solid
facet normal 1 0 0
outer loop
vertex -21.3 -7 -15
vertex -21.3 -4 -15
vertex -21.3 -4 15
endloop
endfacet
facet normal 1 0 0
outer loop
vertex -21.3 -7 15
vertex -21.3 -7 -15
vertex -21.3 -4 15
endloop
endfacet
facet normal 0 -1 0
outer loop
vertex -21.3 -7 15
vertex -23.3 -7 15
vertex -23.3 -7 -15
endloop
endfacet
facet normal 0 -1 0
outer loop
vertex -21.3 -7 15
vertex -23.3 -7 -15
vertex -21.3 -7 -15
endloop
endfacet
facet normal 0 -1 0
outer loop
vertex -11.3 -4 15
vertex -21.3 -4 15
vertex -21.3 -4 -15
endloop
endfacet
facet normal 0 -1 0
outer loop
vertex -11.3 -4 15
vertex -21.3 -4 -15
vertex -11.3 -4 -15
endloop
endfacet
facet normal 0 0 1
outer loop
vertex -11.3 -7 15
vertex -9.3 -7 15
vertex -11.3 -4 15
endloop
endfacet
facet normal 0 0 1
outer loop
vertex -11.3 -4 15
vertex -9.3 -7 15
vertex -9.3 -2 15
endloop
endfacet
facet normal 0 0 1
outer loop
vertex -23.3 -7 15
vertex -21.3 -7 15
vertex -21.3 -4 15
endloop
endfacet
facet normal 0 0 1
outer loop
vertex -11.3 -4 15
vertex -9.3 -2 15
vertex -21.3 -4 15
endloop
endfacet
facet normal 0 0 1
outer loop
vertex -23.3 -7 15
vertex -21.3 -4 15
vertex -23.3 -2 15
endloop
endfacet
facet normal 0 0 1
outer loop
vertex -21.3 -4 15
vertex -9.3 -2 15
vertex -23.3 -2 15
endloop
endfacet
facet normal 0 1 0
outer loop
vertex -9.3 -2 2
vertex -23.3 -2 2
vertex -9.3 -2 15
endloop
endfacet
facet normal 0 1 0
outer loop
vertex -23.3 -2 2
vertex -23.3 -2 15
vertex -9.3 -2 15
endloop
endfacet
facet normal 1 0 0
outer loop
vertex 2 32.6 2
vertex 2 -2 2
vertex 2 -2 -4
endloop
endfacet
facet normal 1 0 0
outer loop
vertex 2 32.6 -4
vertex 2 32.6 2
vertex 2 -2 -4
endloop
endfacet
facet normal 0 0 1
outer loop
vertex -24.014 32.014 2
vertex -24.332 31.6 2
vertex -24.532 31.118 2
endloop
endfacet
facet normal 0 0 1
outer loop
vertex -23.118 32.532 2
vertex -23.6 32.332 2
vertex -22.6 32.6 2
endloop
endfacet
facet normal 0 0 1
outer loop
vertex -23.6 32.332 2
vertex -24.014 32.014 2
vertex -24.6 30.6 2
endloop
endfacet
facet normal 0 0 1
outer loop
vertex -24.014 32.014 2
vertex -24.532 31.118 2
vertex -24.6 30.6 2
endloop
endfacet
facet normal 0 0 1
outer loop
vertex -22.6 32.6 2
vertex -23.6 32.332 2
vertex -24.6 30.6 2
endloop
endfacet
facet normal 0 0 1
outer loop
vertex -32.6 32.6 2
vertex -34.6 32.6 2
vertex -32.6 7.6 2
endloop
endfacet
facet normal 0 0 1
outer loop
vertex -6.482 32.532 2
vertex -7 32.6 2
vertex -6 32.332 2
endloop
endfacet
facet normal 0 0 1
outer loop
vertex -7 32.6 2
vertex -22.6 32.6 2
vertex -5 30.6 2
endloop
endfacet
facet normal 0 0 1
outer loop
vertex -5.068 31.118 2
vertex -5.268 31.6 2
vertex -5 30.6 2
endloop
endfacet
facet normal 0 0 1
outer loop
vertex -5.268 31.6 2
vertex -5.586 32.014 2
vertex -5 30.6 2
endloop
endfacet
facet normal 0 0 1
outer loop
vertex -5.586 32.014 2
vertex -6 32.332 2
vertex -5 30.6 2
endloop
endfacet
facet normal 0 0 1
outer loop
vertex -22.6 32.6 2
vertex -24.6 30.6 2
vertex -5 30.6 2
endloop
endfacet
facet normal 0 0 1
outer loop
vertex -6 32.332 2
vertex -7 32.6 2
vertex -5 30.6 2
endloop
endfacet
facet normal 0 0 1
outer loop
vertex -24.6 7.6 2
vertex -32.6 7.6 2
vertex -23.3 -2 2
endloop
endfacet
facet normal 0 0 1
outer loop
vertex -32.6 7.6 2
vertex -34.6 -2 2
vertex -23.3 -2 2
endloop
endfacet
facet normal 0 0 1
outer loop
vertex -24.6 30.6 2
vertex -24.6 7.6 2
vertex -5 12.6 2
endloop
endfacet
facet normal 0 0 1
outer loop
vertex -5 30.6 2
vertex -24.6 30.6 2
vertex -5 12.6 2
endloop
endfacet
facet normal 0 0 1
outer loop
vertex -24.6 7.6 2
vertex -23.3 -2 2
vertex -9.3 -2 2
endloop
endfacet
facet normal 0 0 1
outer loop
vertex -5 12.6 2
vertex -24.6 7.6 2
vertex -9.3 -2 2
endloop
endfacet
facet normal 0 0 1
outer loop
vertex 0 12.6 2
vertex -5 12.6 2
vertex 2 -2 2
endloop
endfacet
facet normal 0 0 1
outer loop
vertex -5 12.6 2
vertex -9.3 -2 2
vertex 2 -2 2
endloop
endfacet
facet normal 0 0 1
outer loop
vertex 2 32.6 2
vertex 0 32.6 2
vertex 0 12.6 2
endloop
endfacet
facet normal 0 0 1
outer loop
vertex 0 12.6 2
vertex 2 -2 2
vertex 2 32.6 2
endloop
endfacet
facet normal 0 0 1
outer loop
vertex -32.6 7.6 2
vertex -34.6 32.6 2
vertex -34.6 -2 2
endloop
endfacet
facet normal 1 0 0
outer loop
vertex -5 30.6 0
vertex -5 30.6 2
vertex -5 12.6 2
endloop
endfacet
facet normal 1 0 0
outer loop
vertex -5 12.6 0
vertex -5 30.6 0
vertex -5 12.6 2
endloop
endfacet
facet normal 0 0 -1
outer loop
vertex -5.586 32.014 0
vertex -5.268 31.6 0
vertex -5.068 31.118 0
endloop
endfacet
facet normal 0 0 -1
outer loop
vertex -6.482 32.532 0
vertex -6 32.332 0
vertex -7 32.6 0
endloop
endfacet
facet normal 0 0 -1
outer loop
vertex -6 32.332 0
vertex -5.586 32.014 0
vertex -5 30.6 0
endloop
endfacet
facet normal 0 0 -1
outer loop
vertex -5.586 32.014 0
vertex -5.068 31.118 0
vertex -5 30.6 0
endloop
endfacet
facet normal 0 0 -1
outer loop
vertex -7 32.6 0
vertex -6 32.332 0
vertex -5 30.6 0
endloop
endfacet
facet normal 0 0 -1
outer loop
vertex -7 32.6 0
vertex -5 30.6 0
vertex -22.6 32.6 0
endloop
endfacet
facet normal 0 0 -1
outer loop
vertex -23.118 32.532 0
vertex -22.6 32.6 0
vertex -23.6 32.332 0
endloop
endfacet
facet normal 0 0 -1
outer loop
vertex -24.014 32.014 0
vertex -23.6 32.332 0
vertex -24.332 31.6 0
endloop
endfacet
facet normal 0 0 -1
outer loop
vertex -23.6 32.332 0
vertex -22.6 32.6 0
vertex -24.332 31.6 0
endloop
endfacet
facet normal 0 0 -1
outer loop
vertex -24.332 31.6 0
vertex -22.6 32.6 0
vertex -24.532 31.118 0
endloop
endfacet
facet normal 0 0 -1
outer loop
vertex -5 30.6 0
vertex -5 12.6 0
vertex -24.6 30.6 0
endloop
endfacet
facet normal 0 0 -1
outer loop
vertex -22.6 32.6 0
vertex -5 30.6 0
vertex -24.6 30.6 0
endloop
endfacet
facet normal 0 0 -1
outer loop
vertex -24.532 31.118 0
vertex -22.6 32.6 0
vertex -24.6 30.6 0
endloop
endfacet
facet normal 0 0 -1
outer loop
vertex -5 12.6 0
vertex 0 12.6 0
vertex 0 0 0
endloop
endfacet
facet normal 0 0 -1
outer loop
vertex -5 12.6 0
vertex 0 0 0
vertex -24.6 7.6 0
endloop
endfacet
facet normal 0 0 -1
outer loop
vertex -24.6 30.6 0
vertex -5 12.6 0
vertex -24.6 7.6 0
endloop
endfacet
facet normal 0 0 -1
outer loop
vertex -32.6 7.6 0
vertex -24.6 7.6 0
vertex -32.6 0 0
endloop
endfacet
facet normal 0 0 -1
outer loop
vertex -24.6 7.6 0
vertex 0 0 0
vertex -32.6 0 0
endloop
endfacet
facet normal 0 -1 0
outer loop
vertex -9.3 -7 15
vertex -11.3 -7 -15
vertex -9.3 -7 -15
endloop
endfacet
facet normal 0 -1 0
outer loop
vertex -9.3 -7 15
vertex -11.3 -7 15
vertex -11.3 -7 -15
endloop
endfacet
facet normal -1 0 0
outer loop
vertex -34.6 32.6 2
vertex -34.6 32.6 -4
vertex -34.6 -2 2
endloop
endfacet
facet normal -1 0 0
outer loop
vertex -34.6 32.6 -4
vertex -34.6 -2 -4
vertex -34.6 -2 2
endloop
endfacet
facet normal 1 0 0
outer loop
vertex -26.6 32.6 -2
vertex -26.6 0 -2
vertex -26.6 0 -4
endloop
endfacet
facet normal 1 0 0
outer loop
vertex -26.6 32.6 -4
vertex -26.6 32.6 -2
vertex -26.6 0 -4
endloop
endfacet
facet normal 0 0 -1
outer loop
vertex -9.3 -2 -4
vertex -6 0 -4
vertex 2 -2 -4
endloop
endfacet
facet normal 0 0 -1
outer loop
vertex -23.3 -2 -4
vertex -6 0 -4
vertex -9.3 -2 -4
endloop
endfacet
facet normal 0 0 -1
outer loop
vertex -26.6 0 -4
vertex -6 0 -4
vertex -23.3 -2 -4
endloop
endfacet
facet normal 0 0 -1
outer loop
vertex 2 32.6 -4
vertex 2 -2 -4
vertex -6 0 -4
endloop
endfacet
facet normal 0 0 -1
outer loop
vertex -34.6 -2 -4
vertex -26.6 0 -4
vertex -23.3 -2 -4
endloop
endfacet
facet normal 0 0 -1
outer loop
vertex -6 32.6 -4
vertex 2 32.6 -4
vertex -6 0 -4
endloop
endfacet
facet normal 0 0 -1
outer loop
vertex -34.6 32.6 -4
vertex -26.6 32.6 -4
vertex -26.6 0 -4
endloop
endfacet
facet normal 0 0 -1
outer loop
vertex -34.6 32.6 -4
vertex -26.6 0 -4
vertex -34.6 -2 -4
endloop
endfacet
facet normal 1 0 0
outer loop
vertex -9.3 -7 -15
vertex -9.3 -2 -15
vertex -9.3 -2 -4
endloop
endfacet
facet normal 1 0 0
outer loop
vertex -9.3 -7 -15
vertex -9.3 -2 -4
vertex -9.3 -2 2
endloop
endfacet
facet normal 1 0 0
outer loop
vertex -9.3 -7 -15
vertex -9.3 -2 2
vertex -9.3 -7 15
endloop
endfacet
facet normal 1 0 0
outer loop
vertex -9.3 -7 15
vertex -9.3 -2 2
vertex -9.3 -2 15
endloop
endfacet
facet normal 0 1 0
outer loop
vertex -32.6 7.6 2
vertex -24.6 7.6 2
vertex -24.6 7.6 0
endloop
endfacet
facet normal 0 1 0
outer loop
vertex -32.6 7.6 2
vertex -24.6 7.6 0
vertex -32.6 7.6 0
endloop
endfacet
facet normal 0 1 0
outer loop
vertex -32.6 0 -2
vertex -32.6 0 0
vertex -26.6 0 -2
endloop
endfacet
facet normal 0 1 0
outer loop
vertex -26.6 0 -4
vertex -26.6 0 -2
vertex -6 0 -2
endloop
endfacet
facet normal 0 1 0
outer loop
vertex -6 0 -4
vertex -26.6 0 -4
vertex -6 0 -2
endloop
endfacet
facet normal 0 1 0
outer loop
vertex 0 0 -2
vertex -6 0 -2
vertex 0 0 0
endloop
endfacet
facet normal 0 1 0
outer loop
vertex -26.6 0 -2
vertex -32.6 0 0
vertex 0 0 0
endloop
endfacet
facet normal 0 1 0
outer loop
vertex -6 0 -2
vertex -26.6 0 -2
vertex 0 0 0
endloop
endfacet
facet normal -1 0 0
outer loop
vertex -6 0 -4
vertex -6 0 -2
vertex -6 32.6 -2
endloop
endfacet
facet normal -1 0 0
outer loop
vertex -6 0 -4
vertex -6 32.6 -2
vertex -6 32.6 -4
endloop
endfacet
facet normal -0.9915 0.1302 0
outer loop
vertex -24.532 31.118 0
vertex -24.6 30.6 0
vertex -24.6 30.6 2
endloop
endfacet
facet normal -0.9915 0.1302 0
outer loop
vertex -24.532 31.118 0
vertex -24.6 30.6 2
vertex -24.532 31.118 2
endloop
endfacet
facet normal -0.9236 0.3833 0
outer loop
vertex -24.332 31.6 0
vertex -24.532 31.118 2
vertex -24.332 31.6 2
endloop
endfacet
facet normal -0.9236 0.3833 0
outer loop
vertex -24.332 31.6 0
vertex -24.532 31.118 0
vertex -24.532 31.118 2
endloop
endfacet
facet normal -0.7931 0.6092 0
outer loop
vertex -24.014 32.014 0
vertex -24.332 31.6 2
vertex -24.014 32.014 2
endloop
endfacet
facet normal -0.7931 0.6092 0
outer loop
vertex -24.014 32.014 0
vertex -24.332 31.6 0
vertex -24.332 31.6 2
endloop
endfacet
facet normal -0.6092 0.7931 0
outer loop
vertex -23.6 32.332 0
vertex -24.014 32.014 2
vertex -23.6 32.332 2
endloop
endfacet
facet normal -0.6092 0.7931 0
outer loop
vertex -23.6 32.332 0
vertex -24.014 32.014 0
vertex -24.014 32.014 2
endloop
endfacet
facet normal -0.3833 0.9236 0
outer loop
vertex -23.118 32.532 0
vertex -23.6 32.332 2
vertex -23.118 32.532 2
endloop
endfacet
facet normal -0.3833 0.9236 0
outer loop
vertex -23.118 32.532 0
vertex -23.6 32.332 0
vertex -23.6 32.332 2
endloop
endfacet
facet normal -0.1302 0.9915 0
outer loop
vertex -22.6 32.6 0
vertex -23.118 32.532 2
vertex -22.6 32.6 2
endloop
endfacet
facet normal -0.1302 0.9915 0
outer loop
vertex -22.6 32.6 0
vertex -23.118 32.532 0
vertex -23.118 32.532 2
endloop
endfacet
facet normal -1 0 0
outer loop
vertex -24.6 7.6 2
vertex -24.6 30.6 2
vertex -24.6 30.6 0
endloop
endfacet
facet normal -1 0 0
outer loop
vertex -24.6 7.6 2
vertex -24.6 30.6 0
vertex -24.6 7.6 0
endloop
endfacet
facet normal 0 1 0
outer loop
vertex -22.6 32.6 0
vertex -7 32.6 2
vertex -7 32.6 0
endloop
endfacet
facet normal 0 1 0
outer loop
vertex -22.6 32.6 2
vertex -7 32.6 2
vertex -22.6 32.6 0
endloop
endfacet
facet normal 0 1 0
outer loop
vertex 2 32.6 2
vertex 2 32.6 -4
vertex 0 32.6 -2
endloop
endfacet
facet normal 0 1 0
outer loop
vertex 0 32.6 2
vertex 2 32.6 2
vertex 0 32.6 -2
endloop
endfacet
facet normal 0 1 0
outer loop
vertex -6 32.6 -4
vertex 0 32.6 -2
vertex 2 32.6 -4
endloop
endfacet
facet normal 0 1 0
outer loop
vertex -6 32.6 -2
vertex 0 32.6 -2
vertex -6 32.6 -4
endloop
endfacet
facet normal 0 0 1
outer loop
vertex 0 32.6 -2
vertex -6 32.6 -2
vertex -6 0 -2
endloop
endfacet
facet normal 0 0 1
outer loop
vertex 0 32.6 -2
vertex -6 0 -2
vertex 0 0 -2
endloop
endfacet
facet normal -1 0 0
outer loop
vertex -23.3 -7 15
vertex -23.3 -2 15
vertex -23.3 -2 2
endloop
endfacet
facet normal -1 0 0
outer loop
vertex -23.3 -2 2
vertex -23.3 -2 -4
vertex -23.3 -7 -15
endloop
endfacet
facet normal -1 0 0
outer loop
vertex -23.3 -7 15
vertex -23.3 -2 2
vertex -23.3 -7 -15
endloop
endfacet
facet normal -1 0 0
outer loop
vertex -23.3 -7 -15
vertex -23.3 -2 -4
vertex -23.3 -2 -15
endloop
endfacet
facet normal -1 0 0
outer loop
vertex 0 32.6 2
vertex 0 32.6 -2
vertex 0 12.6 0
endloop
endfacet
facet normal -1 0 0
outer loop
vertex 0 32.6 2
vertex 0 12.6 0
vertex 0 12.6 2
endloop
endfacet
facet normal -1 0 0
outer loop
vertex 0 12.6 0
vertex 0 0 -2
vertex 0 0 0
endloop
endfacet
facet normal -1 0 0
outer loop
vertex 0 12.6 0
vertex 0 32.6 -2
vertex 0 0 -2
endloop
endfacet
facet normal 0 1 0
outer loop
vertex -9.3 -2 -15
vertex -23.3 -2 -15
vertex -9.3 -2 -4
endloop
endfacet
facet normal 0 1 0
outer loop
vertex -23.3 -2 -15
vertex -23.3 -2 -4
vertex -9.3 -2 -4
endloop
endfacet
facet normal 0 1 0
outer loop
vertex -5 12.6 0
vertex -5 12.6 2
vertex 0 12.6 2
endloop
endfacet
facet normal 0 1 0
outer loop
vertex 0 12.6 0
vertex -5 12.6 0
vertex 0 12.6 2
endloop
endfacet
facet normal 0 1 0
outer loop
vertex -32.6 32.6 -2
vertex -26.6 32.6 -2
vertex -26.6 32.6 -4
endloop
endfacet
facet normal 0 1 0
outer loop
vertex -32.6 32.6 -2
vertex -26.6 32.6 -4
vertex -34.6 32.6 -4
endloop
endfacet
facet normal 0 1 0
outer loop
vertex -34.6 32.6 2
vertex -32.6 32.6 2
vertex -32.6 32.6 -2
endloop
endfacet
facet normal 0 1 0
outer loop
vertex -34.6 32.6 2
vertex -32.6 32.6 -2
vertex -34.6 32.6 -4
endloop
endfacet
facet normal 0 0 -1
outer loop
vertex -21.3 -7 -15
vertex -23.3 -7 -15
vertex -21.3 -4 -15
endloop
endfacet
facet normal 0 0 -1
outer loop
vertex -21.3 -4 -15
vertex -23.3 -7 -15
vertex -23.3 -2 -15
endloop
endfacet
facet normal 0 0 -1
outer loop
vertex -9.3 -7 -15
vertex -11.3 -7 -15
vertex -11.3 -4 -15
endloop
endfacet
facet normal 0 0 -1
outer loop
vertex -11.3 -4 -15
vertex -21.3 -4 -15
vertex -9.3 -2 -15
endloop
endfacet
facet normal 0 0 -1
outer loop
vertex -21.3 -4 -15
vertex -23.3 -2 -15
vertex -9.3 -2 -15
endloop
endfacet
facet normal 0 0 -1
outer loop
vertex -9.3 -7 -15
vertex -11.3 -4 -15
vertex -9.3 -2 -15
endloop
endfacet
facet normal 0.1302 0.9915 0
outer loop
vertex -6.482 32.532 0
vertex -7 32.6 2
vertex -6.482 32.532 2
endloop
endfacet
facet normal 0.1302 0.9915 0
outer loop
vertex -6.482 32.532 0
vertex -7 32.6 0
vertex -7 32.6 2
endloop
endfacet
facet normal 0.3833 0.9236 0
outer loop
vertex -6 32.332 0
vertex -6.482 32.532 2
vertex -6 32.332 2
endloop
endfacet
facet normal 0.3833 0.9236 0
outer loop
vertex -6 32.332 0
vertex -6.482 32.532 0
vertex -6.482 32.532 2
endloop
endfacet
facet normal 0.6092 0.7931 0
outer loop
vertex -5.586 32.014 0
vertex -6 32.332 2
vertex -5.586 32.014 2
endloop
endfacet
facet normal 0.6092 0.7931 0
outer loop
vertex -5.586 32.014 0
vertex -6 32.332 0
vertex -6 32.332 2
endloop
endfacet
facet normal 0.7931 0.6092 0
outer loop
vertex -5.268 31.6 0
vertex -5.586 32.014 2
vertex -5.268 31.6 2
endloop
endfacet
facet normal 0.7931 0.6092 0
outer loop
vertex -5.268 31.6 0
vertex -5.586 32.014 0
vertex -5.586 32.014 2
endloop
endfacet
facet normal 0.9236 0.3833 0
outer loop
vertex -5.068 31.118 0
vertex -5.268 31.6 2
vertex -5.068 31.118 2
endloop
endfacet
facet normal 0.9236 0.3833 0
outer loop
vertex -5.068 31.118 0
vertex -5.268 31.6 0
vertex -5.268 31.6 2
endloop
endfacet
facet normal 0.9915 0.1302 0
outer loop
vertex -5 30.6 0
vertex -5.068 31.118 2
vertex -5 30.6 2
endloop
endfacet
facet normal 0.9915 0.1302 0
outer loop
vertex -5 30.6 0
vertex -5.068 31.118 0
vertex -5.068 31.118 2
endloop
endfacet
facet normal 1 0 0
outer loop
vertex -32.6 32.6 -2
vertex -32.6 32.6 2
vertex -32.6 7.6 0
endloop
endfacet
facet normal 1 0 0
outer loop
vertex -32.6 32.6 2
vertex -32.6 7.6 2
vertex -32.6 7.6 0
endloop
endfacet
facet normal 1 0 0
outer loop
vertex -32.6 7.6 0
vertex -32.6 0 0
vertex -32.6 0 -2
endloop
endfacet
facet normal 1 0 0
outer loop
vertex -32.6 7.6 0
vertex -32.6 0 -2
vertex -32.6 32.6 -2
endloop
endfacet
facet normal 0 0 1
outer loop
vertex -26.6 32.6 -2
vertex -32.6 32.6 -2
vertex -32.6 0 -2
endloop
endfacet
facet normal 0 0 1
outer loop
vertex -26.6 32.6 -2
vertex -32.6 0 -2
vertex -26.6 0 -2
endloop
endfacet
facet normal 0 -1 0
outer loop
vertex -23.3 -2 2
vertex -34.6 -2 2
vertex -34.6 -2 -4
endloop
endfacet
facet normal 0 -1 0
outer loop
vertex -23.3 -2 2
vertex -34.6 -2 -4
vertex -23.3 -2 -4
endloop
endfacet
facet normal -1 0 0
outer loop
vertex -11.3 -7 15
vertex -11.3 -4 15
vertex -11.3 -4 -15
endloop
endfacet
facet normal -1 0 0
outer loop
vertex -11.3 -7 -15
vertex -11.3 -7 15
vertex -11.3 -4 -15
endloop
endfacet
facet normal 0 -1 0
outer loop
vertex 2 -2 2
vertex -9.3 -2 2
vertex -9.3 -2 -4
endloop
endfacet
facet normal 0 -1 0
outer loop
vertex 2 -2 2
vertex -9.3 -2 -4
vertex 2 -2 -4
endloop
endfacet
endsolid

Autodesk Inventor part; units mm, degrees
ref_plane "YZ Plane" through (0, 0, 0) normal (1, 0, 0) x (0, 1, 0)
ref_plane "XZ Plane" through (0, 0, 0) normal (0, 1, 0) x (-1, 0, 0)
ref_plane "XY Plane" through (0, 0, 0) normal (0, 0, 1) x (1, 0, 0)
sketch "스케치1" plane through (0, 0, 0) normal (0, 1, 0) x (-1, 0, 0)
  line L0 (0, 0) -> (32.6, 0)
  line L1 (32.6, 0) -> (32.6, -2)
  line L2 (0, -2) -> (0, 0)
  line L3 (34.6, -4) -> (34.6, 2)
  line L4 (34.6, 2) -> (-2, 2)
  line L5 (-2, 2) -> (-2, -4)
  line L6 (26.6, -2) -> (26.6, -4)
  line L7 (6, -2) -> (6, -4)
  line L8 (32.6, -2) -> (26.6, -2)
  line L9 (6, -2) -> (0, -2)
  line L10 (-2, -4) -> (6, -4)
  line L11 (26.6, -4) -> (34.6, -4)
  dimension "d0" = 32.6
  dimension "d1" = 2
  dimension "d3" = 6
  dimension "d4" = 6
extrude "돌출1" add sketch "스케치1" along normal blind 32.6
sketch "스케치2" plane through (0, 0, 0) normal (0, -1, 0) x (1, 0, 0)
  line L0 (0, -2) -> (0, 0) projected
  line L1 (-6, -2) -> (0, -2) projected
  line L2 (-6, -4) -> (-6, -2) projected
  line L3 (2, -4) -> (-6, -4) projected
  line L4 (2, 2) -> (2, -4) projected
  line L5 (-34.6, 2) -> (2, 2) projected
  line L6 (-34.6, -4) -> (-34.6, 2) projected
  line L7 (-26.6, -4) -> (-34.6, -4) projected
  line L8 (-26.6, -2) -> (-26.6, -4) projected
  line L9 (-32.6, -2) -> (-26.6, -2) projected
  line L10 (-32.6, 0) -> (-32.6, -2) projected
  line L11 (0, 0) -> (-32.6, 0) projected
  line L12 (-6, -4) -> (-6, -2) projected
  line L13 (-6, -4) -> (-26.6, -4)
extrude "돌출2" add sketch "스케치2" along normal blind 2
sketch "스케치3" plane through (-34.6, 32.6, 2) normal (0, 0, 1) x (1, 0, 0)
  line L0 (2, -32.6) -> (2, 0) projected
  line L1 (2, 0) -> (10, 0)
  line L2 (10, 0) -> (10, -25)
  line L3 (10, -25) -> (2, -25)
  line L4 (2, -25) -> (2, 0)
  line L5 (0, 0) -> (36.6, 0) projected
  point P0 (34.6, -32.6)
  point P1 (2, -25)
  dimension "d9" = 8
  dimension "d10" = 25
extrude "돌출3" cut sketch "스케치3" against normal blind 2
sketch "스케치4" plane through (0, -2, 0) normal (0, -1, 0) x (1, 0, 0)
  line L0 (-9.3, 15) -> (-23.3, 15)
  line L1 (-23.3, 15) -> (-23.3, -15)
  line L2 (-23.3, -15) -> (-9.3, -15)
  line L3 (-9.3, -15) -> (-9.3, 15)
  line L4 (-34.6, -4) -> (2, -4) projected
  line L5 (-9.3, 15) -> (-11.3, 15)
  line L6 (-11.3, 15) -> (-11.3, -15)
  line L7 (-11.3, -15) -> (-9.3, -15)
  line L8 (-9.3, -15) -> (-9.3, 15)
  line L9 (-23.3, -15) -> (-21.3, -15)
  line L10 (-21.3, -15) -> (-21.3, 15)
  line L11 (-21.3, 15) -> (-23.3, 15)
  line L12 (-23.3, 15) -> (-23.3, -15)
  line L13 (-21.3, 15) -> (-23.3, 15)
  line L14 (-23.3, 15) -> (-23.3, -15)
  line L15 (-23.3, -15) -> (-21.3, -15)
  line L16 (-21.3, -15) -> (-21.3, 15)
  point P0 (0, 0)
  point P1 (-16.3, -15)
  point P2 (-16.3, -4)
  point P3 (-9.3, 0)
  point P4 (-21.3, -4)
  point P5 (-23.3, -4)
  point P6 (-21.3, -4)
  dimension "d13" = 14
  dimension "d14" = 30
  dimension "d15" = 2
  dimension "d16" = 2
extrude "돌출4" add sketch "스케치4" along normal blind 2
extrude "돌출5" add sketch "스케치4" along normal blind 5 contours L3 L4 L6 L0 | L3 L2 L6 L4 | L10 L4 L1 L0
extrude "돌출6" add sketch "스케치4" along normal blind 5 contours L10 L2 L1 L4
sketch "스케치5" plane through (-34.6, 32.6, 2) normal (0, 0, 1) x (1, 0, 0)
  line L0 (28.6, 0) -> (34.6, 0) projected
  line L1 (34.6, 0) -> (29.6, 0)
  line L2 (29.6, 0) -> (29.6, -20)
  line L3 (29.6, -20) -> (34.6, -20)
  line L4 (34.6, -20) -> (34.6, 0)
  point P0 (34.6, -32.6)
  dimension "d23" = 5
  dimension "d24" = 20
extrude "돌출7" cut sketch "스케치5" against normal blind 2
fillet "모깎기1" radius 2 2 edges at (-5, 32.6, 1) (-24.6, 32.6, 1)
properties part number "end effector"
